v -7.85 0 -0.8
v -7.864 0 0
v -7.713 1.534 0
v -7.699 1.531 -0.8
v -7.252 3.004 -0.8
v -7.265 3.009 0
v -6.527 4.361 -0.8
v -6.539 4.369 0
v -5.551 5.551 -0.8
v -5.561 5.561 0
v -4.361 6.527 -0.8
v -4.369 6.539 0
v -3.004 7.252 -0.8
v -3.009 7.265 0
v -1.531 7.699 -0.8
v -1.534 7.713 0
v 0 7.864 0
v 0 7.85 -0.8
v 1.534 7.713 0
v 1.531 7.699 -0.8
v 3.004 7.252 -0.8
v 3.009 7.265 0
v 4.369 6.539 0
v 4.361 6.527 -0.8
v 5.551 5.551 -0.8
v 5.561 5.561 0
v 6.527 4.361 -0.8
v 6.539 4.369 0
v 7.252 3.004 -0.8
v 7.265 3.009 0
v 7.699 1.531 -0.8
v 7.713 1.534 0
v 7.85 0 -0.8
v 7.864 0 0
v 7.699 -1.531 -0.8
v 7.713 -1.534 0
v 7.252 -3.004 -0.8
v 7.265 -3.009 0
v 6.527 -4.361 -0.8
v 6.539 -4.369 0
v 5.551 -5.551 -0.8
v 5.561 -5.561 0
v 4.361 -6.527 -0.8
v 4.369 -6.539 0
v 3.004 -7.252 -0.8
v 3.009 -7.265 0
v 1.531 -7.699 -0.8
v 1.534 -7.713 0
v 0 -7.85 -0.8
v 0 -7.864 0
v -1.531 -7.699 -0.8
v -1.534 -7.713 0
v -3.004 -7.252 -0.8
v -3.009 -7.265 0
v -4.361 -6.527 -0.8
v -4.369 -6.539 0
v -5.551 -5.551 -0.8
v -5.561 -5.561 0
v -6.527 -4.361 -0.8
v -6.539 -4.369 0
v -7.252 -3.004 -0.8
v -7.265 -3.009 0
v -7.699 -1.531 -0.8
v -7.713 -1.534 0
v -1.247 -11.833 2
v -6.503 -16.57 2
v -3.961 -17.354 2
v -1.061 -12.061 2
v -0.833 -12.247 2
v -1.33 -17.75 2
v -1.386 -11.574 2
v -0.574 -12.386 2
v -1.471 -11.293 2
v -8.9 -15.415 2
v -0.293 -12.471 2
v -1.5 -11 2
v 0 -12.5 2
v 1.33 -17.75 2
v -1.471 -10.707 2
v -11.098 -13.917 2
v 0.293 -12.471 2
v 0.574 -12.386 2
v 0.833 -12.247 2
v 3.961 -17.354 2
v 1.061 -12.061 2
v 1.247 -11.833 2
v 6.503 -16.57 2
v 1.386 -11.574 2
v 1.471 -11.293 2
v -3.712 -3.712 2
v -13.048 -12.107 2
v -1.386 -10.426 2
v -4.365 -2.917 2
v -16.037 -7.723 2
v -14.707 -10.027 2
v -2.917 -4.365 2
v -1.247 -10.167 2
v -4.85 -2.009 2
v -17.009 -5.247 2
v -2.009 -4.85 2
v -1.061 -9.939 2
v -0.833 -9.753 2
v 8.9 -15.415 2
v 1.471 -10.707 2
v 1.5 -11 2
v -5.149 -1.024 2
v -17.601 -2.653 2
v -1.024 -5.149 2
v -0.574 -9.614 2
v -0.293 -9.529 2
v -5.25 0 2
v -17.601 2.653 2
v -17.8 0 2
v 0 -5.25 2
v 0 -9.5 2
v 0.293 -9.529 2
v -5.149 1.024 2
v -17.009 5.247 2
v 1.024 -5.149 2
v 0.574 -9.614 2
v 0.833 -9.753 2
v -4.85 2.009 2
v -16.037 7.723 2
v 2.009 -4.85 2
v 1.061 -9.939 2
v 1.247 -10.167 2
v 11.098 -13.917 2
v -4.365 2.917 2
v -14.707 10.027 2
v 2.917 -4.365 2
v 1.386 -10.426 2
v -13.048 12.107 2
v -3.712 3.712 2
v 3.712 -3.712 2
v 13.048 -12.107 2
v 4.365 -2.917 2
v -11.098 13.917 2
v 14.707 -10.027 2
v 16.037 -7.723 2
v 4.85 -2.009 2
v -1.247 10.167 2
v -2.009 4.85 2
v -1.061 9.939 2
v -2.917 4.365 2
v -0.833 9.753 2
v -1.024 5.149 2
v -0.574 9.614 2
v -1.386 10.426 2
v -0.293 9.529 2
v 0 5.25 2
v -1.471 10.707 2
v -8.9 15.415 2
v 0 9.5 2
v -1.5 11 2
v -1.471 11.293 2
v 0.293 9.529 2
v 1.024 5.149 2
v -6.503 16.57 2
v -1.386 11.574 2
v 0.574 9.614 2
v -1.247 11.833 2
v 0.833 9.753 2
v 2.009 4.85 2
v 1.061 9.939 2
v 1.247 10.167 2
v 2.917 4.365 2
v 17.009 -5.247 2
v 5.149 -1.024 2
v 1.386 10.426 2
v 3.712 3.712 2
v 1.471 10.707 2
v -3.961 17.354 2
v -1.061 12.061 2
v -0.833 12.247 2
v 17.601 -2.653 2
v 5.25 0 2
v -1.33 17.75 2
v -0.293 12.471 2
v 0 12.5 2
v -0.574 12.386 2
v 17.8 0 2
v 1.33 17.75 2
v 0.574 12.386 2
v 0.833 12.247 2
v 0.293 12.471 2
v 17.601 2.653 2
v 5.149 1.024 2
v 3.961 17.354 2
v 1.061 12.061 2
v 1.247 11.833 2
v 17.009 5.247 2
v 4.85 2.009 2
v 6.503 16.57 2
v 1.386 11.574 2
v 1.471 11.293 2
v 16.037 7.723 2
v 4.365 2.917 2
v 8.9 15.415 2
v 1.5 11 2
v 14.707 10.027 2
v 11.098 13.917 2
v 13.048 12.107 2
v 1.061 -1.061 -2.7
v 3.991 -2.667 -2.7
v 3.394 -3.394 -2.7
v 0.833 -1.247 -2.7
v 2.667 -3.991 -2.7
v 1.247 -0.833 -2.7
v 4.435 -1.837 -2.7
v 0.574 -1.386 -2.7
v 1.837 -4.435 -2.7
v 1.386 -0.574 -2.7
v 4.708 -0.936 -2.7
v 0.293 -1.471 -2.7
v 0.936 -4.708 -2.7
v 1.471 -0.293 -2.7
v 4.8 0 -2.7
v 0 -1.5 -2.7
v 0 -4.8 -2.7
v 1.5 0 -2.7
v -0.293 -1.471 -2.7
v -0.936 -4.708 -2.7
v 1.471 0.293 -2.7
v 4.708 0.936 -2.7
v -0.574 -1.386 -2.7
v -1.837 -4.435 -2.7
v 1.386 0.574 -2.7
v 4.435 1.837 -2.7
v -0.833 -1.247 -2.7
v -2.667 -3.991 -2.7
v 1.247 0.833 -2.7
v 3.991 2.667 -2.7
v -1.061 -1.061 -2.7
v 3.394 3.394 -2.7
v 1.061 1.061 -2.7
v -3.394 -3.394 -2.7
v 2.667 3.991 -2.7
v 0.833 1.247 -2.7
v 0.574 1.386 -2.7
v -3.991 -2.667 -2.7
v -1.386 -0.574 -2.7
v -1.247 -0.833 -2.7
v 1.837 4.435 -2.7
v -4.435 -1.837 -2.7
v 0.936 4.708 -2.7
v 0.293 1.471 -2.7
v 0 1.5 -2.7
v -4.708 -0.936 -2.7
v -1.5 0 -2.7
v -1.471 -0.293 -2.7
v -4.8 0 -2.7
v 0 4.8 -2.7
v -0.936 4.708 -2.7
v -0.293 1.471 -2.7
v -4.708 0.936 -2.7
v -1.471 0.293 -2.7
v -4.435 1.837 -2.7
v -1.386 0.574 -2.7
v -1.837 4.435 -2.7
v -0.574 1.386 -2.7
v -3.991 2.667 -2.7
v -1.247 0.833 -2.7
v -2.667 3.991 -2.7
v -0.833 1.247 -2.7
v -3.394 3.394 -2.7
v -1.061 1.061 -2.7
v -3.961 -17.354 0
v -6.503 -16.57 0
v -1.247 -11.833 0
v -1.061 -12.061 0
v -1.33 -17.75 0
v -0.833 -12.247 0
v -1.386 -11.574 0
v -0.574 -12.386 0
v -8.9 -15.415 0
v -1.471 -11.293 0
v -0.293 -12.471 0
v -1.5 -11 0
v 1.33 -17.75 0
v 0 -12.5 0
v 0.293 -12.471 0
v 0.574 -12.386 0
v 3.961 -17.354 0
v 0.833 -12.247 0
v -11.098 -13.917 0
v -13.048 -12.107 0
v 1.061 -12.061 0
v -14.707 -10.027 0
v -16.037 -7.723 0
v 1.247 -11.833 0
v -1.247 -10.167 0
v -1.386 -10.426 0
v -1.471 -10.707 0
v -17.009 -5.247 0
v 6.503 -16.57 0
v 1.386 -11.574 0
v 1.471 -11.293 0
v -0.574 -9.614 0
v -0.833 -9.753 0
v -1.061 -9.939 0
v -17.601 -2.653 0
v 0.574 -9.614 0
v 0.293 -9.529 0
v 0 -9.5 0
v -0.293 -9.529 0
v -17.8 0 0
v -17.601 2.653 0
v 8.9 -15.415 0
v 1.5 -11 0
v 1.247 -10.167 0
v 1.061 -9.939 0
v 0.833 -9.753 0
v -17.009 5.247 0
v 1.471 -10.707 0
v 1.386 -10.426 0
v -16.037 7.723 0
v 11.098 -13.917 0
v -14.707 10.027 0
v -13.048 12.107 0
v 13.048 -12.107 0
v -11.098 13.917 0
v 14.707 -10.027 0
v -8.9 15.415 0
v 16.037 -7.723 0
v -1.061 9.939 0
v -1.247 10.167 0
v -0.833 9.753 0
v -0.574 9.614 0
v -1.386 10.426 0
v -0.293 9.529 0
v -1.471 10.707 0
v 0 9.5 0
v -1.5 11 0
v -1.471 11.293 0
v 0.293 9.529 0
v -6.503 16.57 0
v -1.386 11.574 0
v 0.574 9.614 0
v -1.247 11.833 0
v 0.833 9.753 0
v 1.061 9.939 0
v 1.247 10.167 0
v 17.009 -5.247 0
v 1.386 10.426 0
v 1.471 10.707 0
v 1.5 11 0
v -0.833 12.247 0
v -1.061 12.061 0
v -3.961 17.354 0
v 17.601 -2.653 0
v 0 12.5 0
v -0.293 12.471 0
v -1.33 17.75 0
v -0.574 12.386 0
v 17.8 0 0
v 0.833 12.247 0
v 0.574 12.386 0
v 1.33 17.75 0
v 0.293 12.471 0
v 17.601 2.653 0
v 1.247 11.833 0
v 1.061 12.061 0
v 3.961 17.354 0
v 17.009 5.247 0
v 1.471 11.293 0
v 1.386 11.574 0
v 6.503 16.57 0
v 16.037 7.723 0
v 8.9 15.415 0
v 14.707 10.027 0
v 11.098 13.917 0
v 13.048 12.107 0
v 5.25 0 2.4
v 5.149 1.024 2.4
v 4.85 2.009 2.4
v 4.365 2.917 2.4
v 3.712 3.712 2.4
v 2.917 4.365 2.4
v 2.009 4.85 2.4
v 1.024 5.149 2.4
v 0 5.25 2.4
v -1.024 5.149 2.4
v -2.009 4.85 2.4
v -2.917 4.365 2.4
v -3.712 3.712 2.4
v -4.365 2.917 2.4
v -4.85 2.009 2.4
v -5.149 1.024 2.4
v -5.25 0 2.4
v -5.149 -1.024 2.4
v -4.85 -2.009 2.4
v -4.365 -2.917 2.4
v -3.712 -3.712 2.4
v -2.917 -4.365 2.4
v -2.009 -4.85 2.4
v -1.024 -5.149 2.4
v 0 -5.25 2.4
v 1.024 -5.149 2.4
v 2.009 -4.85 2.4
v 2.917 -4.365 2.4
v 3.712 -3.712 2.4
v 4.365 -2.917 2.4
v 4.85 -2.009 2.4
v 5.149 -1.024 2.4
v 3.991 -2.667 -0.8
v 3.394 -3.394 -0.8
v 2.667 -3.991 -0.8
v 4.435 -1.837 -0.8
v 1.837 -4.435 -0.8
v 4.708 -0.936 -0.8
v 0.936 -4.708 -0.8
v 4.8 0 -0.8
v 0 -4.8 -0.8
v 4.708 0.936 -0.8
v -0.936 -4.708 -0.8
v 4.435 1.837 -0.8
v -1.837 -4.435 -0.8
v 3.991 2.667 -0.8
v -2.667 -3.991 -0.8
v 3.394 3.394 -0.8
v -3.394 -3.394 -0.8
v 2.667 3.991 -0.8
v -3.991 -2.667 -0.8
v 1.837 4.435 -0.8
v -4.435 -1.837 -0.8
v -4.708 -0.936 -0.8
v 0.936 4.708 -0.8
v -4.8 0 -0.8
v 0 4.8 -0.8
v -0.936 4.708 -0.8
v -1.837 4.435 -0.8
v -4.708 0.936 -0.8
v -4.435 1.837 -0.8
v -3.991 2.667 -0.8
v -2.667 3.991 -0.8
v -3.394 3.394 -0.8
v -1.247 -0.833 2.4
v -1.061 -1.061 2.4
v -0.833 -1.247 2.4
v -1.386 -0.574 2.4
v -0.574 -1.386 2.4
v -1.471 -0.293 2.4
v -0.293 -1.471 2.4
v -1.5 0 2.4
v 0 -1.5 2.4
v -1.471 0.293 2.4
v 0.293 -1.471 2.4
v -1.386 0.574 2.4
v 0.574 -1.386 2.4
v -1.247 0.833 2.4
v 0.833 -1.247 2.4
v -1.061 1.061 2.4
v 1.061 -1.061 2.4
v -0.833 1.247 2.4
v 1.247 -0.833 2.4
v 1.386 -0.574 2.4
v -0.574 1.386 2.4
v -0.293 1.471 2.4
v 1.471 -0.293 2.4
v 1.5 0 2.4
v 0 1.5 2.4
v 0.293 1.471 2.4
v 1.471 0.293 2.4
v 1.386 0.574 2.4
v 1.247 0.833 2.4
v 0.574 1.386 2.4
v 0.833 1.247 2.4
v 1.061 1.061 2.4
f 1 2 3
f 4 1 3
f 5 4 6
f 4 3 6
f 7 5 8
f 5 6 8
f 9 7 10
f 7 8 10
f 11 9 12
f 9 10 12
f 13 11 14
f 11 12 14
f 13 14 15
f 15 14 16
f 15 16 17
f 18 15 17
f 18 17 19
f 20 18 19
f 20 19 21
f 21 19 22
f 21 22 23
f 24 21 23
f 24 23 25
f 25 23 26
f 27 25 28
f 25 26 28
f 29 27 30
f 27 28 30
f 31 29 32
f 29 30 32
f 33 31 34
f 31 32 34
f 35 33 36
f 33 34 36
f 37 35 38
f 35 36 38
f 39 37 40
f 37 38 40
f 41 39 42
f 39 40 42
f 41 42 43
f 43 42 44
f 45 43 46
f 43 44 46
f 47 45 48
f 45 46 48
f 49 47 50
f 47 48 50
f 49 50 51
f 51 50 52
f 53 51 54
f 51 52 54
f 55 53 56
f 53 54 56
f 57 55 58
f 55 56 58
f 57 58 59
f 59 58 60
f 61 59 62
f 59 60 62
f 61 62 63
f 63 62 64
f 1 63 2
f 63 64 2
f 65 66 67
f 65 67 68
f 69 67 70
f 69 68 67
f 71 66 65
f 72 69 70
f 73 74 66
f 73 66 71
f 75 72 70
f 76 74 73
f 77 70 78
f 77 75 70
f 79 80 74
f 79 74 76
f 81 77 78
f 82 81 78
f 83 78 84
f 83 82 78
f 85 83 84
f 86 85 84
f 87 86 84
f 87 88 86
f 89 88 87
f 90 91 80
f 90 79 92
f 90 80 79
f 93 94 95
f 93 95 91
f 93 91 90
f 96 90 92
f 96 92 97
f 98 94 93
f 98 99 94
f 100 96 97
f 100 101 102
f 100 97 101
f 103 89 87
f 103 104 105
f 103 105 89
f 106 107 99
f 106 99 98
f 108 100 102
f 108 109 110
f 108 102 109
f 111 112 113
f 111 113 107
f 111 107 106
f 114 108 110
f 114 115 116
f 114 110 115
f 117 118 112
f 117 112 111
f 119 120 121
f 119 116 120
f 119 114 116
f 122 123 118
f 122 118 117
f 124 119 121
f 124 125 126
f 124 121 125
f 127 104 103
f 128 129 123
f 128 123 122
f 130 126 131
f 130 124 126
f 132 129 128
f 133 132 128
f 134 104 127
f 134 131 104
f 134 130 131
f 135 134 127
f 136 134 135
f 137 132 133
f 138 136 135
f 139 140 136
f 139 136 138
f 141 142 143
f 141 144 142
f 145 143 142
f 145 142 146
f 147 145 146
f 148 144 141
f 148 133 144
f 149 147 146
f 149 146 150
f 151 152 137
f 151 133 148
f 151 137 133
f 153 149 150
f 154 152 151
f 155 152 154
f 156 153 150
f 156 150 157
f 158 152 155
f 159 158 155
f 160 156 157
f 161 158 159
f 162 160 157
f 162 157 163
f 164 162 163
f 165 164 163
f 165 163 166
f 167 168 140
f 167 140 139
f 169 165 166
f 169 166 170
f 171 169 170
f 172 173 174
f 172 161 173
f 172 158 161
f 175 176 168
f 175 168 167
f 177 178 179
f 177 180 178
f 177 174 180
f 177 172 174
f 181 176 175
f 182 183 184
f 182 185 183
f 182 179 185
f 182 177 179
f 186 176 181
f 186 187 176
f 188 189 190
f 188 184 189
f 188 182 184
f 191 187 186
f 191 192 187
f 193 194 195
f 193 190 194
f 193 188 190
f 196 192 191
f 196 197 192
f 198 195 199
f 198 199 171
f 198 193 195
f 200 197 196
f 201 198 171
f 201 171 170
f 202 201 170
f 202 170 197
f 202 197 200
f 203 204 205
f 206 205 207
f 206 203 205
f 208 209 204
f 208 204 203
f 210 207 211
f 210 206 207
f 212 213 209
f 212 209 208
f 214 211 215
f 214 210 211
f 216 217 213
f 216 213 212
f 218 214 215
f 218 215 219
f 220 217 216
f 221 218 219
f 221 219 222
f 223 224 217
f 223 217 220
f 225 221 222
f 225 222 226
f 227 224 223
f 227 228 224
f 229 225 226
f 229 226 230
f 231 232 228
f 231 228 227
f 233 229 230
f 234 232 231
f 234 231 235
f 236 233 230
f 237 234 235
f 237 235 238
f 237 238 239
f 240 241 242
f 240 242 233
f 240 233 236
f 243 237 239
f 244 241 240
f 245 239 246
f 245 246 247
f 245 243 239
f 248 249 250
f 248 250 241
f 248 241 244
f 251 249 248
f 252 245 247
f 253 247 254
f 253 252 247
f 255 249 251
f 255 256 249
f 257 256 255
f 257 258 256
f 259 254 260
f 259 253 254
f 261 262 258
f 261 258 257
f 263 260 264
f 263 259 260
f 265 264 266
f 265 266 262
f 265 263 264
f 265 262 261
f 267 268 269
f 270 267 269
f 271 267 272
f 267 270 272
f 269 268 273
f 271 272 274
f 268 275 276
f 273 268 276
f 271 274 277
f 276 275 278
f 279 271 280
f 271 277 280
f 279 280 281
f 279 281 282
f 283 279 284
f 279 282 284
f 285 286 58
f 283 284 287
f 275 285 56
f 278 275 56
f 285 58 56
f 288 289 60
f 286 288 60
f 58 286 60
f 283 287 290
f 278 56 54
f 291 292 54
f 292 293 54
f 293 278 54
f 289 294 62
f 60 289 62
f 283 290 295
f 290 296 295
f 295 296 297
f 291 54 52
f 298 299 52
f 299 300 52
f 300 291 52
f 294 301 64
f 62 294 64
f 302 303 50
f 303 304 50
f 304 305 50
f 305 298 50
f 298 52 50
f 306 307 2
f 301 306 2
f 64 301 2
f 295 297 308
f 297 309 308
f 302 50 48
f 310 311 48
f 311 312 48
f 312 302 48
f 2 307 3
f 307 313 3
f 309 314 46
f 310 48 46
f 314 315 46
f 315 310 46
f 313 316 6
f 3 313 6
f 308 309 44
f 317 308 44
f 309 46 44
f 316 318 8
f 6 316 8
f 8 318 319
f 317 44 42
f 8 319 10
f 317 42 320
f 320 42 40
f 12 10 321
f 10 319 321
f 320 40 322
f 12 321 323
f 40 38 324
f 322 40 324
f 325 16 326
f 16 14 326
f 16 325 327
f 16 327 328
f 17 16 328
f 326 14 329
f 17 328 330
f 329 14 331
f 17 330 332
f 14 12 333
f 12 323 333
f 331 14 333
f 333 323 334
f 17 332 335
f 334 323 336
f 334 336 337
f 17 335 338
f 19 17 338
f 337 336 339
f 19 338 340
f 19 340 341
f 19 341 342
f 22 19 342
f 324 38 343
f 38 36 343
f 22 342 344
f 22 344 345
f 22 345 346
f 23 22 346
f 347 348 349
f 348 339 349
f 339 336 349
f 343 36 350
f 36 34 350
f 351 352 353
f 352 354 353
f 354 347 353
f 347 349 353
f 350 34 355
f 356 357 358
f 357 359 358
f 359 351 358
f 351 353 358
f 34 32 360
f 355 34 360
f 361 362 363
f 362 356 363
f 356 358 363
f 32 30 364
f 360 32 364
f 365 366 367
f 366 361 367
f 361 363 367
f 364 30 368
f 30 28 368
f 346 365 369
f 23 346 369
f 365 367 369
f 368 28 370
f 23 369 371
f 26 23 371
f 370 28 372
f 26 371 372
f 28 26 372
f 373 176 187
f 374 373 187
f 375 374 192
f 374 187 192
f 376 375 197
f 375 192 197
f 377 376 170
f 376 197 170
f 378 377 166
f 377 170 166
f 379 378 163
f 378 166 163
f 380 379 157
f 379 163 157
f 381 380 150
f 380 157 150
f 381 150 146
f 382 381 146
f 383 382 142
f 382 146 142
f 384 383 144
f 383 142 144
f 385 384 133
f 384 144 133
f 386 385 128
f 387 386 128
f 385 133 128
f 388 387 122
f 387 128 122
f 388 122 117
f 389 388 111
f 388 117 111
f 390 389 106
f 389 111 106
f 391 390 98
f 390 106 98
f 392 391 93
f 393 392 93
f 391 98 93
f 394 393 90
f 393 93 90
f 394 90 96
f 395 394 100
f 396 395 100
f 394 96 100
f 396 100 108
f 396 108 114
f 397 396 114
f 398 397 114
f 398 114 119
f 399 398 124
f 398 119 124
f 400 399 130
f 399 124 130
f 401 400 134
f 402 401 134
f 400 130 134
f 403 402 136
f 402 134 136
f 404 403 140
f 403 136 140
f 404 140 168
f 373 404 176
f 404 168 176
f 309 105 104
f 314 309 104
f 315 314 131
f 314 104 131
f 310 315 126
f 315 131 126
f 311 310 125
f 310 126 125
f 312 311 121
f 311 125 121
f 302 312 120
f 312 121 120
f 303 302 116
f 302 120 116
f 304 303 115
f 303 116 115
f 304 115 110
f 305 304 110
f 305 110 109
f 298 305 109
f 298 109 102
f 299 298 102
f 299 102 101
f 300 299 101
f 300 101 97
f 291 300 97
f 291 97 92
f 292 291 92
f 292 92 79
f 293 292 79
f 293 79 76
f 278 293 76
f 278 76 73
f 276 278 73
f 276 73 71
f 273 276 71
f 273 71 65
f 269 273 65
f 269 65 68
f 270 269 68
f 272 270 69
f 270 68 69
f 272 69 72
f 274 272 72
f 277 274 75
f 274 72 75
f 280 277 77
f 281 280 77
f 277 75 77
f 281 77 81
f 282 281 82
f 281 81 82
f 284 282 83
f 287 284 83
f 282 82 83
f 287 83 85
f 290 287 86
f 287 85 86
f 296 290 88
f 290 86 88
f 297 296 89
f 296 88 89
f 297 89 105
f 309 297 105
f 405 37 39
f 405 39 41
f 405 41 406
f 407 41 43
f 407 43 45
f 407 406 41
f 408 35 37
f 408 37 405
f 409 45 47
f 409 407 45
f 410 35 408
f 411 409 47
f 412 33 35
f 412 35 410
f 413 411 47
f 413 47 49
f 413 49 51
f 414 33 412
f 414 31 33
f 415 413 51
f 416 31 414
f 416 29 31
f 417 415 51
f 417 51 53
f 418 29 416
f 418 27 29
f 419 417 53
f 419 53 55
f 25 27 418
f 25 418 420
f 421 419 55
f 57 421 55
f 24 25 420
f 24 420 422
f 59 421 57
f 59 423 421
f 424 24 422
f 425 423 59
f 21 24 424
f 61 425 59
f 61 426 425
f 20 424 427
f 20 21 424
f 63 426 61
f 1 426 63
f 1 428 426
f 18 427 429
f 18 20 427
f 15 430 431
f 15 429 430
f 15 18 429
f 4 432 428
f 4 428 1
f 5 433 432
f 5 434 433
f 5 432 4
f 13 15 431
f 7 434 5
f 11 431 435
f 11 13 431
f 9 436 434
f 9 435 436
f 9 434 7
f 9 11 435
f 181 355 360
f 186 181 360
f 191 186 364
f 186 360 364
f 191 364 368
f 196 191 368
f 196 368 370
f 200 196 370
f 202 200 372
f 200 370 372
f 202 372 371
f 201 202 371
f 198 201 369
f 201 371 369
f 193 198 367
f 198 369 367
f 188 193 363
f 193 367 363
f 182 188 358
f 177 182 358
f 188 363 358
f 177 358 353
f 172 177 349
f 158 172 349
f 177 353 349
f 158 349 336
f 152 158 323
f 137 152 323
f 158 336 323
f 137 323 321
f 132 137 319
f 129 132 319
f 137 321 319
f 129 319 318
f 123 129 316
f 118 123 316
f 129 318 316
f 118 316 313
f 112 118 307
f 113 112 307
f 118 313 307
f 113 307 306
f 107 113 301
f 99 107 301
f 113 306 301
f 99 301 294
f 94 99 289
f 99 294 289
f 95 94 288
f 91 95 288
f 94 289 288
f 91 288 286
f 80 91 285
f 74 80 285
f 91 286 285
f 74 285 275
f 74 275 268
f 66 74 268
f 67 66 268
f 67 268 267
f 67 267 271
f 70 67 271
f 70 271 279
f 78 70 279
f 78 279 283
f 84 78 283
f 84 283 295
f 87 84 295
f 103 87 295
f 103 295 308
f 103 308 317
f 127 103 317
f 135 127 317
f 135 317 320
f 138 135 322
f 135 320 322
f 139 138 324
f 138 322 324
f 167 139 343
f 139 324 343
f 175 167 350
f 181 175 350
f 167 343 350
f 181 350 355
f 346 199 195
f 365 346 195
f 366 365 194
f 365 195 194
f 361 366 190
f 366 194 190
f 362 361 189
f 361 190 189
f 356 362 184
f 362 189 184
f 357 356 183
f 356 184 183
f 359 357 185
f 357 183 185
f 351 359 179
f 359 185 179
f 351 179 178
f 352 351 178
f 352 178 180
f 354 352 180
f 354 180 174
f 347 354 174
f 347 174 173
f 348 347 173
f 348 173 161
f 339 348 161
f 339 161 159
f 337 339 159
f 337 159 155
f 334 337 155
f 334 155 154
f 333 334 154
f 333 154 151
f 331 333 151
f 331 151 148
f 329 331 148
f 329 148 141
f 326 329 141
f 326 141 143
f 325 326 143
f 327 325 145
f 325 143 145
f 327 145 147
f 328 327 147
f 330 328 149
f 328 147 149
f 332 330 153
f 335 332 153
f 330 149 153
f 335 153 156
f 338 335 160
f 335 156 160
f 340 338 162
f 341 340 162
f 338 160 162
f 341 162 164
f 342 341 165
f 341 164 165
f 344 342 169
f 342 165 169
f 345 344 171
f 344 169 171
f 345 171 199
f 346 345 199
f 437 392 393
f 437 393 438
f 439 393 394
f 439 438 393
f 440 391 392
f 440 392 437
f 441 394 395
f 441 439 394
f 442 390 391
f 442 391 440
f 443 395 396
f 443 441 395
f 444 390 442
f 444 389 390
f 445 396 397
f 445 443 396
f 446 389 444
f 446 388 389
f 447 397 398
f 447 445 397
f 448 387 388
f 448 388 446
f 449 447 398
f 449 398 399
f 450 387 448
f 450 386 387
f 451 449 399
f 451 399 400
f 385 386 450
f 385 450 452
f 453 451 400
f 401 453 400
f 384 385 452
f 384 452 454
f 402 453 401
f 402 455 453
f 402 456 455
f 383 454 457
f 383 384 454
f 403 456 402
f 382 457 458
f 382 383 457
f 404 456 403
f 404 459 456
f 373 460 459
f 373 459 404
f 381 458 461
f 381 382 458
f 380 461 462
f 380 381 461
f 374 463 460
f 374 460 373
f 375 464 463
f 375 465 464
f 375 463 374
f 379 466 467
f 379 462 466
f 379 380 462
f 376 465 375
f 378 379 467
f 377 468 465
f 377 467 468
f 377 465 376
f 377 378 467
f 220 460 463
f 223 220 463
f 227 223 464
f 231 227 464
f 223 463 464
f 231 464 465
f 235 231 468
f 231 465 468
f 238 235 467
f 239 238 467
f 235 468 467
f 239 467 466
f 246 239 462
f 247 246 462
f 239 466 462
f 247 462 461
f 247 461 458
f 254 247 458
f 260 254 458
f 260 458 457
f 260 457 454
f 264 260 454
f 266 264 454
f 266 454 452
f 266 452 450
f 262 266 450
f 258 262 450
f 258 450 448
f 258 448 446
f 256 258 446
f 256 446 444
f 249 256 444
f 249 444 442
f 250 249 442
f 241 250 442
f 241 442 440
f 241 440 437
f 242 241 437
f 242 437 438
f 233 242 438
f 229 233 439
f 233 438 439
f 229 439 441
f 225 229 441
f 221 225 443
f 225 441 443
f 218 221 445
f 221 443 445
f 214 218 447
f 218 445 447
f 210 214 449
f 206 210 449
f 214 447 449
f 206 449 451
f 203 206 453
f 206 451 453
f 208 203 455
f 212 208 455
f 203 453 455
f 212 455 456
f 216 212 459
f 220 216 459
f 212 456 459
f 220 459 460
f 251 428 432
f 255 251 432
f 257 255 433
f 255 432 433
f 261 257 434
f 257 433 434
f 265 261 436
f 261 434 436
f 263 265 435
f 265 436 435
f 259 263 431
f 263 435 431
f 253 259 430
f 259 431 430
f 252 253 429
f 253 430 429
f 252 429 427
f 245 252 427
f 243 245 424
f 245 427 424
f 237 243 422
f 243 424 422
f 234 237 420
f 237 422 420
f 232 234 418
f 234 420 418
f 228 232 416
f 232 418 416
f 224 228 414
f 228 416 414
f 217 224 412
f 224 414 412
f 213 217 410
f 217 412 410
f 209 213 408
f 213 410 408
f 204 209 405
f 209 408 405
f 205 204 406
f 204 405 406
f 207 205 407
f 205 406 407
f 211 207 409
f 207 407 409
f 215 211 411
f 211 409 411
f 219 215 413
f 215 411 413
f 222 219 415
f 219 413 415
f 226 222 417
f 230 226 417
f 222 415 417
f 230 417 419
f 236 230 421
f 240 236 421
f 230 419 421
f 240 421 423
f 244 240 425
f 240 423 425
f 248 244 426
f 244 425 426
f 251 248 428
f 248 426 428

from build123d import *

# Parameters (mm, degrees)
SKETCH_1_R          = 17.8
EXTRUDE_1_DEPTH     = 2
SKETCH_2_R          = 7.85
EXTRUDE_2_DEPTH     = 0.8
DRAFT_1_ANGLE       = 1
SKETCH_38_R         = 4.8
EXTRUDE_3_DEPTH     = 1.9
SKETCH_39_R         = 5.25
EXTRUDE_4_DEPTH     = 0.4
SKETCH_40_R         = 1.5
CUT_EXTRUDE_1_DEPTH = 10.4
SKETCH_42_R         = 1.5
CUT_EXTRUDE_3_DEPTH = 10


with BuildPart() as part:
    # ｽｹｯﾁ1 → ﾎﾞｽ - 押し出し1 (new body)
    with BuildSketch(Plane.XY):
        Circle(SKETCH_1_R)
    extrude(amount=EXTRUDE_1_DEPTH)

    # ｽｹｯﾁ2 → ﾎﾞｽ - 押し出し2 (add)
    with BuildSketch(Plane(origin=(0, 0, 0), x_dir=(-1, 0, 0), z_dir=(0, 0, -1))):
        Circle(SKETCH_2_R)
    extrude(amount=EXTRUDE_2_DEPTH)

    # 抜き勾配1
    draft_1_faces = [part.faces().sort_by_distance(p)[0] for p in [
        (7.85, 0, -0.4),
    ]]
    draft(draft_1_faces, Plane(origin=(0, 0, -0.8), x_dir=(-1, 0, 0), z_dir=(0, 0, -1)), DRAFT_1_ANGLE)

    # ｽｹｯﾁ38 → ﾎﾞｽ - 押し出し3 (add)
    with BuildSketch(Plane(origin=(0, 0, -0.8), x_dir=(-1, 0, 0), z_dir=(0, 0, -1))):
        Circle(SKETCH_38_R)
    extrude(amount=EXTRUDE_3_DEPTH)

    # ｽｹｯﾁ39 → ﾎﾞｽ - 押し出し4 (add)
    with BuildSketch(Plane.XY.offset(2)):
        Circle(SKETCH_39_R)
    extrude(amount=EXTRUDE_4_DEPTH)

    # ｽｹｯﾁ40 → ｶｯﾄ - 押し出し1 (cut)
    with BuildSketch(Plane.XY.offset(2.4)):
        Circle(SKETCH_40_R)
    extrude(amount=-CUT_EXTRUDE_1_DEPTH, mode=Mode.SUBTRACT)

    # ｽｹｯﾁ42 → ｶｯﾄ - 押し出し3 (cut)
    with BuildSketch(Plane.XY.offset(2)):
        with Locations((0, 11)):
            Circle(SKETCH_42_R)
        with Locations((0, -11)):
            Circle(SKETCH_42_R)
    extrude(amount=-CUT_EXTRUDE_3_DEPTH, mode=Mode.SUBTRACT)


solid = part.part
